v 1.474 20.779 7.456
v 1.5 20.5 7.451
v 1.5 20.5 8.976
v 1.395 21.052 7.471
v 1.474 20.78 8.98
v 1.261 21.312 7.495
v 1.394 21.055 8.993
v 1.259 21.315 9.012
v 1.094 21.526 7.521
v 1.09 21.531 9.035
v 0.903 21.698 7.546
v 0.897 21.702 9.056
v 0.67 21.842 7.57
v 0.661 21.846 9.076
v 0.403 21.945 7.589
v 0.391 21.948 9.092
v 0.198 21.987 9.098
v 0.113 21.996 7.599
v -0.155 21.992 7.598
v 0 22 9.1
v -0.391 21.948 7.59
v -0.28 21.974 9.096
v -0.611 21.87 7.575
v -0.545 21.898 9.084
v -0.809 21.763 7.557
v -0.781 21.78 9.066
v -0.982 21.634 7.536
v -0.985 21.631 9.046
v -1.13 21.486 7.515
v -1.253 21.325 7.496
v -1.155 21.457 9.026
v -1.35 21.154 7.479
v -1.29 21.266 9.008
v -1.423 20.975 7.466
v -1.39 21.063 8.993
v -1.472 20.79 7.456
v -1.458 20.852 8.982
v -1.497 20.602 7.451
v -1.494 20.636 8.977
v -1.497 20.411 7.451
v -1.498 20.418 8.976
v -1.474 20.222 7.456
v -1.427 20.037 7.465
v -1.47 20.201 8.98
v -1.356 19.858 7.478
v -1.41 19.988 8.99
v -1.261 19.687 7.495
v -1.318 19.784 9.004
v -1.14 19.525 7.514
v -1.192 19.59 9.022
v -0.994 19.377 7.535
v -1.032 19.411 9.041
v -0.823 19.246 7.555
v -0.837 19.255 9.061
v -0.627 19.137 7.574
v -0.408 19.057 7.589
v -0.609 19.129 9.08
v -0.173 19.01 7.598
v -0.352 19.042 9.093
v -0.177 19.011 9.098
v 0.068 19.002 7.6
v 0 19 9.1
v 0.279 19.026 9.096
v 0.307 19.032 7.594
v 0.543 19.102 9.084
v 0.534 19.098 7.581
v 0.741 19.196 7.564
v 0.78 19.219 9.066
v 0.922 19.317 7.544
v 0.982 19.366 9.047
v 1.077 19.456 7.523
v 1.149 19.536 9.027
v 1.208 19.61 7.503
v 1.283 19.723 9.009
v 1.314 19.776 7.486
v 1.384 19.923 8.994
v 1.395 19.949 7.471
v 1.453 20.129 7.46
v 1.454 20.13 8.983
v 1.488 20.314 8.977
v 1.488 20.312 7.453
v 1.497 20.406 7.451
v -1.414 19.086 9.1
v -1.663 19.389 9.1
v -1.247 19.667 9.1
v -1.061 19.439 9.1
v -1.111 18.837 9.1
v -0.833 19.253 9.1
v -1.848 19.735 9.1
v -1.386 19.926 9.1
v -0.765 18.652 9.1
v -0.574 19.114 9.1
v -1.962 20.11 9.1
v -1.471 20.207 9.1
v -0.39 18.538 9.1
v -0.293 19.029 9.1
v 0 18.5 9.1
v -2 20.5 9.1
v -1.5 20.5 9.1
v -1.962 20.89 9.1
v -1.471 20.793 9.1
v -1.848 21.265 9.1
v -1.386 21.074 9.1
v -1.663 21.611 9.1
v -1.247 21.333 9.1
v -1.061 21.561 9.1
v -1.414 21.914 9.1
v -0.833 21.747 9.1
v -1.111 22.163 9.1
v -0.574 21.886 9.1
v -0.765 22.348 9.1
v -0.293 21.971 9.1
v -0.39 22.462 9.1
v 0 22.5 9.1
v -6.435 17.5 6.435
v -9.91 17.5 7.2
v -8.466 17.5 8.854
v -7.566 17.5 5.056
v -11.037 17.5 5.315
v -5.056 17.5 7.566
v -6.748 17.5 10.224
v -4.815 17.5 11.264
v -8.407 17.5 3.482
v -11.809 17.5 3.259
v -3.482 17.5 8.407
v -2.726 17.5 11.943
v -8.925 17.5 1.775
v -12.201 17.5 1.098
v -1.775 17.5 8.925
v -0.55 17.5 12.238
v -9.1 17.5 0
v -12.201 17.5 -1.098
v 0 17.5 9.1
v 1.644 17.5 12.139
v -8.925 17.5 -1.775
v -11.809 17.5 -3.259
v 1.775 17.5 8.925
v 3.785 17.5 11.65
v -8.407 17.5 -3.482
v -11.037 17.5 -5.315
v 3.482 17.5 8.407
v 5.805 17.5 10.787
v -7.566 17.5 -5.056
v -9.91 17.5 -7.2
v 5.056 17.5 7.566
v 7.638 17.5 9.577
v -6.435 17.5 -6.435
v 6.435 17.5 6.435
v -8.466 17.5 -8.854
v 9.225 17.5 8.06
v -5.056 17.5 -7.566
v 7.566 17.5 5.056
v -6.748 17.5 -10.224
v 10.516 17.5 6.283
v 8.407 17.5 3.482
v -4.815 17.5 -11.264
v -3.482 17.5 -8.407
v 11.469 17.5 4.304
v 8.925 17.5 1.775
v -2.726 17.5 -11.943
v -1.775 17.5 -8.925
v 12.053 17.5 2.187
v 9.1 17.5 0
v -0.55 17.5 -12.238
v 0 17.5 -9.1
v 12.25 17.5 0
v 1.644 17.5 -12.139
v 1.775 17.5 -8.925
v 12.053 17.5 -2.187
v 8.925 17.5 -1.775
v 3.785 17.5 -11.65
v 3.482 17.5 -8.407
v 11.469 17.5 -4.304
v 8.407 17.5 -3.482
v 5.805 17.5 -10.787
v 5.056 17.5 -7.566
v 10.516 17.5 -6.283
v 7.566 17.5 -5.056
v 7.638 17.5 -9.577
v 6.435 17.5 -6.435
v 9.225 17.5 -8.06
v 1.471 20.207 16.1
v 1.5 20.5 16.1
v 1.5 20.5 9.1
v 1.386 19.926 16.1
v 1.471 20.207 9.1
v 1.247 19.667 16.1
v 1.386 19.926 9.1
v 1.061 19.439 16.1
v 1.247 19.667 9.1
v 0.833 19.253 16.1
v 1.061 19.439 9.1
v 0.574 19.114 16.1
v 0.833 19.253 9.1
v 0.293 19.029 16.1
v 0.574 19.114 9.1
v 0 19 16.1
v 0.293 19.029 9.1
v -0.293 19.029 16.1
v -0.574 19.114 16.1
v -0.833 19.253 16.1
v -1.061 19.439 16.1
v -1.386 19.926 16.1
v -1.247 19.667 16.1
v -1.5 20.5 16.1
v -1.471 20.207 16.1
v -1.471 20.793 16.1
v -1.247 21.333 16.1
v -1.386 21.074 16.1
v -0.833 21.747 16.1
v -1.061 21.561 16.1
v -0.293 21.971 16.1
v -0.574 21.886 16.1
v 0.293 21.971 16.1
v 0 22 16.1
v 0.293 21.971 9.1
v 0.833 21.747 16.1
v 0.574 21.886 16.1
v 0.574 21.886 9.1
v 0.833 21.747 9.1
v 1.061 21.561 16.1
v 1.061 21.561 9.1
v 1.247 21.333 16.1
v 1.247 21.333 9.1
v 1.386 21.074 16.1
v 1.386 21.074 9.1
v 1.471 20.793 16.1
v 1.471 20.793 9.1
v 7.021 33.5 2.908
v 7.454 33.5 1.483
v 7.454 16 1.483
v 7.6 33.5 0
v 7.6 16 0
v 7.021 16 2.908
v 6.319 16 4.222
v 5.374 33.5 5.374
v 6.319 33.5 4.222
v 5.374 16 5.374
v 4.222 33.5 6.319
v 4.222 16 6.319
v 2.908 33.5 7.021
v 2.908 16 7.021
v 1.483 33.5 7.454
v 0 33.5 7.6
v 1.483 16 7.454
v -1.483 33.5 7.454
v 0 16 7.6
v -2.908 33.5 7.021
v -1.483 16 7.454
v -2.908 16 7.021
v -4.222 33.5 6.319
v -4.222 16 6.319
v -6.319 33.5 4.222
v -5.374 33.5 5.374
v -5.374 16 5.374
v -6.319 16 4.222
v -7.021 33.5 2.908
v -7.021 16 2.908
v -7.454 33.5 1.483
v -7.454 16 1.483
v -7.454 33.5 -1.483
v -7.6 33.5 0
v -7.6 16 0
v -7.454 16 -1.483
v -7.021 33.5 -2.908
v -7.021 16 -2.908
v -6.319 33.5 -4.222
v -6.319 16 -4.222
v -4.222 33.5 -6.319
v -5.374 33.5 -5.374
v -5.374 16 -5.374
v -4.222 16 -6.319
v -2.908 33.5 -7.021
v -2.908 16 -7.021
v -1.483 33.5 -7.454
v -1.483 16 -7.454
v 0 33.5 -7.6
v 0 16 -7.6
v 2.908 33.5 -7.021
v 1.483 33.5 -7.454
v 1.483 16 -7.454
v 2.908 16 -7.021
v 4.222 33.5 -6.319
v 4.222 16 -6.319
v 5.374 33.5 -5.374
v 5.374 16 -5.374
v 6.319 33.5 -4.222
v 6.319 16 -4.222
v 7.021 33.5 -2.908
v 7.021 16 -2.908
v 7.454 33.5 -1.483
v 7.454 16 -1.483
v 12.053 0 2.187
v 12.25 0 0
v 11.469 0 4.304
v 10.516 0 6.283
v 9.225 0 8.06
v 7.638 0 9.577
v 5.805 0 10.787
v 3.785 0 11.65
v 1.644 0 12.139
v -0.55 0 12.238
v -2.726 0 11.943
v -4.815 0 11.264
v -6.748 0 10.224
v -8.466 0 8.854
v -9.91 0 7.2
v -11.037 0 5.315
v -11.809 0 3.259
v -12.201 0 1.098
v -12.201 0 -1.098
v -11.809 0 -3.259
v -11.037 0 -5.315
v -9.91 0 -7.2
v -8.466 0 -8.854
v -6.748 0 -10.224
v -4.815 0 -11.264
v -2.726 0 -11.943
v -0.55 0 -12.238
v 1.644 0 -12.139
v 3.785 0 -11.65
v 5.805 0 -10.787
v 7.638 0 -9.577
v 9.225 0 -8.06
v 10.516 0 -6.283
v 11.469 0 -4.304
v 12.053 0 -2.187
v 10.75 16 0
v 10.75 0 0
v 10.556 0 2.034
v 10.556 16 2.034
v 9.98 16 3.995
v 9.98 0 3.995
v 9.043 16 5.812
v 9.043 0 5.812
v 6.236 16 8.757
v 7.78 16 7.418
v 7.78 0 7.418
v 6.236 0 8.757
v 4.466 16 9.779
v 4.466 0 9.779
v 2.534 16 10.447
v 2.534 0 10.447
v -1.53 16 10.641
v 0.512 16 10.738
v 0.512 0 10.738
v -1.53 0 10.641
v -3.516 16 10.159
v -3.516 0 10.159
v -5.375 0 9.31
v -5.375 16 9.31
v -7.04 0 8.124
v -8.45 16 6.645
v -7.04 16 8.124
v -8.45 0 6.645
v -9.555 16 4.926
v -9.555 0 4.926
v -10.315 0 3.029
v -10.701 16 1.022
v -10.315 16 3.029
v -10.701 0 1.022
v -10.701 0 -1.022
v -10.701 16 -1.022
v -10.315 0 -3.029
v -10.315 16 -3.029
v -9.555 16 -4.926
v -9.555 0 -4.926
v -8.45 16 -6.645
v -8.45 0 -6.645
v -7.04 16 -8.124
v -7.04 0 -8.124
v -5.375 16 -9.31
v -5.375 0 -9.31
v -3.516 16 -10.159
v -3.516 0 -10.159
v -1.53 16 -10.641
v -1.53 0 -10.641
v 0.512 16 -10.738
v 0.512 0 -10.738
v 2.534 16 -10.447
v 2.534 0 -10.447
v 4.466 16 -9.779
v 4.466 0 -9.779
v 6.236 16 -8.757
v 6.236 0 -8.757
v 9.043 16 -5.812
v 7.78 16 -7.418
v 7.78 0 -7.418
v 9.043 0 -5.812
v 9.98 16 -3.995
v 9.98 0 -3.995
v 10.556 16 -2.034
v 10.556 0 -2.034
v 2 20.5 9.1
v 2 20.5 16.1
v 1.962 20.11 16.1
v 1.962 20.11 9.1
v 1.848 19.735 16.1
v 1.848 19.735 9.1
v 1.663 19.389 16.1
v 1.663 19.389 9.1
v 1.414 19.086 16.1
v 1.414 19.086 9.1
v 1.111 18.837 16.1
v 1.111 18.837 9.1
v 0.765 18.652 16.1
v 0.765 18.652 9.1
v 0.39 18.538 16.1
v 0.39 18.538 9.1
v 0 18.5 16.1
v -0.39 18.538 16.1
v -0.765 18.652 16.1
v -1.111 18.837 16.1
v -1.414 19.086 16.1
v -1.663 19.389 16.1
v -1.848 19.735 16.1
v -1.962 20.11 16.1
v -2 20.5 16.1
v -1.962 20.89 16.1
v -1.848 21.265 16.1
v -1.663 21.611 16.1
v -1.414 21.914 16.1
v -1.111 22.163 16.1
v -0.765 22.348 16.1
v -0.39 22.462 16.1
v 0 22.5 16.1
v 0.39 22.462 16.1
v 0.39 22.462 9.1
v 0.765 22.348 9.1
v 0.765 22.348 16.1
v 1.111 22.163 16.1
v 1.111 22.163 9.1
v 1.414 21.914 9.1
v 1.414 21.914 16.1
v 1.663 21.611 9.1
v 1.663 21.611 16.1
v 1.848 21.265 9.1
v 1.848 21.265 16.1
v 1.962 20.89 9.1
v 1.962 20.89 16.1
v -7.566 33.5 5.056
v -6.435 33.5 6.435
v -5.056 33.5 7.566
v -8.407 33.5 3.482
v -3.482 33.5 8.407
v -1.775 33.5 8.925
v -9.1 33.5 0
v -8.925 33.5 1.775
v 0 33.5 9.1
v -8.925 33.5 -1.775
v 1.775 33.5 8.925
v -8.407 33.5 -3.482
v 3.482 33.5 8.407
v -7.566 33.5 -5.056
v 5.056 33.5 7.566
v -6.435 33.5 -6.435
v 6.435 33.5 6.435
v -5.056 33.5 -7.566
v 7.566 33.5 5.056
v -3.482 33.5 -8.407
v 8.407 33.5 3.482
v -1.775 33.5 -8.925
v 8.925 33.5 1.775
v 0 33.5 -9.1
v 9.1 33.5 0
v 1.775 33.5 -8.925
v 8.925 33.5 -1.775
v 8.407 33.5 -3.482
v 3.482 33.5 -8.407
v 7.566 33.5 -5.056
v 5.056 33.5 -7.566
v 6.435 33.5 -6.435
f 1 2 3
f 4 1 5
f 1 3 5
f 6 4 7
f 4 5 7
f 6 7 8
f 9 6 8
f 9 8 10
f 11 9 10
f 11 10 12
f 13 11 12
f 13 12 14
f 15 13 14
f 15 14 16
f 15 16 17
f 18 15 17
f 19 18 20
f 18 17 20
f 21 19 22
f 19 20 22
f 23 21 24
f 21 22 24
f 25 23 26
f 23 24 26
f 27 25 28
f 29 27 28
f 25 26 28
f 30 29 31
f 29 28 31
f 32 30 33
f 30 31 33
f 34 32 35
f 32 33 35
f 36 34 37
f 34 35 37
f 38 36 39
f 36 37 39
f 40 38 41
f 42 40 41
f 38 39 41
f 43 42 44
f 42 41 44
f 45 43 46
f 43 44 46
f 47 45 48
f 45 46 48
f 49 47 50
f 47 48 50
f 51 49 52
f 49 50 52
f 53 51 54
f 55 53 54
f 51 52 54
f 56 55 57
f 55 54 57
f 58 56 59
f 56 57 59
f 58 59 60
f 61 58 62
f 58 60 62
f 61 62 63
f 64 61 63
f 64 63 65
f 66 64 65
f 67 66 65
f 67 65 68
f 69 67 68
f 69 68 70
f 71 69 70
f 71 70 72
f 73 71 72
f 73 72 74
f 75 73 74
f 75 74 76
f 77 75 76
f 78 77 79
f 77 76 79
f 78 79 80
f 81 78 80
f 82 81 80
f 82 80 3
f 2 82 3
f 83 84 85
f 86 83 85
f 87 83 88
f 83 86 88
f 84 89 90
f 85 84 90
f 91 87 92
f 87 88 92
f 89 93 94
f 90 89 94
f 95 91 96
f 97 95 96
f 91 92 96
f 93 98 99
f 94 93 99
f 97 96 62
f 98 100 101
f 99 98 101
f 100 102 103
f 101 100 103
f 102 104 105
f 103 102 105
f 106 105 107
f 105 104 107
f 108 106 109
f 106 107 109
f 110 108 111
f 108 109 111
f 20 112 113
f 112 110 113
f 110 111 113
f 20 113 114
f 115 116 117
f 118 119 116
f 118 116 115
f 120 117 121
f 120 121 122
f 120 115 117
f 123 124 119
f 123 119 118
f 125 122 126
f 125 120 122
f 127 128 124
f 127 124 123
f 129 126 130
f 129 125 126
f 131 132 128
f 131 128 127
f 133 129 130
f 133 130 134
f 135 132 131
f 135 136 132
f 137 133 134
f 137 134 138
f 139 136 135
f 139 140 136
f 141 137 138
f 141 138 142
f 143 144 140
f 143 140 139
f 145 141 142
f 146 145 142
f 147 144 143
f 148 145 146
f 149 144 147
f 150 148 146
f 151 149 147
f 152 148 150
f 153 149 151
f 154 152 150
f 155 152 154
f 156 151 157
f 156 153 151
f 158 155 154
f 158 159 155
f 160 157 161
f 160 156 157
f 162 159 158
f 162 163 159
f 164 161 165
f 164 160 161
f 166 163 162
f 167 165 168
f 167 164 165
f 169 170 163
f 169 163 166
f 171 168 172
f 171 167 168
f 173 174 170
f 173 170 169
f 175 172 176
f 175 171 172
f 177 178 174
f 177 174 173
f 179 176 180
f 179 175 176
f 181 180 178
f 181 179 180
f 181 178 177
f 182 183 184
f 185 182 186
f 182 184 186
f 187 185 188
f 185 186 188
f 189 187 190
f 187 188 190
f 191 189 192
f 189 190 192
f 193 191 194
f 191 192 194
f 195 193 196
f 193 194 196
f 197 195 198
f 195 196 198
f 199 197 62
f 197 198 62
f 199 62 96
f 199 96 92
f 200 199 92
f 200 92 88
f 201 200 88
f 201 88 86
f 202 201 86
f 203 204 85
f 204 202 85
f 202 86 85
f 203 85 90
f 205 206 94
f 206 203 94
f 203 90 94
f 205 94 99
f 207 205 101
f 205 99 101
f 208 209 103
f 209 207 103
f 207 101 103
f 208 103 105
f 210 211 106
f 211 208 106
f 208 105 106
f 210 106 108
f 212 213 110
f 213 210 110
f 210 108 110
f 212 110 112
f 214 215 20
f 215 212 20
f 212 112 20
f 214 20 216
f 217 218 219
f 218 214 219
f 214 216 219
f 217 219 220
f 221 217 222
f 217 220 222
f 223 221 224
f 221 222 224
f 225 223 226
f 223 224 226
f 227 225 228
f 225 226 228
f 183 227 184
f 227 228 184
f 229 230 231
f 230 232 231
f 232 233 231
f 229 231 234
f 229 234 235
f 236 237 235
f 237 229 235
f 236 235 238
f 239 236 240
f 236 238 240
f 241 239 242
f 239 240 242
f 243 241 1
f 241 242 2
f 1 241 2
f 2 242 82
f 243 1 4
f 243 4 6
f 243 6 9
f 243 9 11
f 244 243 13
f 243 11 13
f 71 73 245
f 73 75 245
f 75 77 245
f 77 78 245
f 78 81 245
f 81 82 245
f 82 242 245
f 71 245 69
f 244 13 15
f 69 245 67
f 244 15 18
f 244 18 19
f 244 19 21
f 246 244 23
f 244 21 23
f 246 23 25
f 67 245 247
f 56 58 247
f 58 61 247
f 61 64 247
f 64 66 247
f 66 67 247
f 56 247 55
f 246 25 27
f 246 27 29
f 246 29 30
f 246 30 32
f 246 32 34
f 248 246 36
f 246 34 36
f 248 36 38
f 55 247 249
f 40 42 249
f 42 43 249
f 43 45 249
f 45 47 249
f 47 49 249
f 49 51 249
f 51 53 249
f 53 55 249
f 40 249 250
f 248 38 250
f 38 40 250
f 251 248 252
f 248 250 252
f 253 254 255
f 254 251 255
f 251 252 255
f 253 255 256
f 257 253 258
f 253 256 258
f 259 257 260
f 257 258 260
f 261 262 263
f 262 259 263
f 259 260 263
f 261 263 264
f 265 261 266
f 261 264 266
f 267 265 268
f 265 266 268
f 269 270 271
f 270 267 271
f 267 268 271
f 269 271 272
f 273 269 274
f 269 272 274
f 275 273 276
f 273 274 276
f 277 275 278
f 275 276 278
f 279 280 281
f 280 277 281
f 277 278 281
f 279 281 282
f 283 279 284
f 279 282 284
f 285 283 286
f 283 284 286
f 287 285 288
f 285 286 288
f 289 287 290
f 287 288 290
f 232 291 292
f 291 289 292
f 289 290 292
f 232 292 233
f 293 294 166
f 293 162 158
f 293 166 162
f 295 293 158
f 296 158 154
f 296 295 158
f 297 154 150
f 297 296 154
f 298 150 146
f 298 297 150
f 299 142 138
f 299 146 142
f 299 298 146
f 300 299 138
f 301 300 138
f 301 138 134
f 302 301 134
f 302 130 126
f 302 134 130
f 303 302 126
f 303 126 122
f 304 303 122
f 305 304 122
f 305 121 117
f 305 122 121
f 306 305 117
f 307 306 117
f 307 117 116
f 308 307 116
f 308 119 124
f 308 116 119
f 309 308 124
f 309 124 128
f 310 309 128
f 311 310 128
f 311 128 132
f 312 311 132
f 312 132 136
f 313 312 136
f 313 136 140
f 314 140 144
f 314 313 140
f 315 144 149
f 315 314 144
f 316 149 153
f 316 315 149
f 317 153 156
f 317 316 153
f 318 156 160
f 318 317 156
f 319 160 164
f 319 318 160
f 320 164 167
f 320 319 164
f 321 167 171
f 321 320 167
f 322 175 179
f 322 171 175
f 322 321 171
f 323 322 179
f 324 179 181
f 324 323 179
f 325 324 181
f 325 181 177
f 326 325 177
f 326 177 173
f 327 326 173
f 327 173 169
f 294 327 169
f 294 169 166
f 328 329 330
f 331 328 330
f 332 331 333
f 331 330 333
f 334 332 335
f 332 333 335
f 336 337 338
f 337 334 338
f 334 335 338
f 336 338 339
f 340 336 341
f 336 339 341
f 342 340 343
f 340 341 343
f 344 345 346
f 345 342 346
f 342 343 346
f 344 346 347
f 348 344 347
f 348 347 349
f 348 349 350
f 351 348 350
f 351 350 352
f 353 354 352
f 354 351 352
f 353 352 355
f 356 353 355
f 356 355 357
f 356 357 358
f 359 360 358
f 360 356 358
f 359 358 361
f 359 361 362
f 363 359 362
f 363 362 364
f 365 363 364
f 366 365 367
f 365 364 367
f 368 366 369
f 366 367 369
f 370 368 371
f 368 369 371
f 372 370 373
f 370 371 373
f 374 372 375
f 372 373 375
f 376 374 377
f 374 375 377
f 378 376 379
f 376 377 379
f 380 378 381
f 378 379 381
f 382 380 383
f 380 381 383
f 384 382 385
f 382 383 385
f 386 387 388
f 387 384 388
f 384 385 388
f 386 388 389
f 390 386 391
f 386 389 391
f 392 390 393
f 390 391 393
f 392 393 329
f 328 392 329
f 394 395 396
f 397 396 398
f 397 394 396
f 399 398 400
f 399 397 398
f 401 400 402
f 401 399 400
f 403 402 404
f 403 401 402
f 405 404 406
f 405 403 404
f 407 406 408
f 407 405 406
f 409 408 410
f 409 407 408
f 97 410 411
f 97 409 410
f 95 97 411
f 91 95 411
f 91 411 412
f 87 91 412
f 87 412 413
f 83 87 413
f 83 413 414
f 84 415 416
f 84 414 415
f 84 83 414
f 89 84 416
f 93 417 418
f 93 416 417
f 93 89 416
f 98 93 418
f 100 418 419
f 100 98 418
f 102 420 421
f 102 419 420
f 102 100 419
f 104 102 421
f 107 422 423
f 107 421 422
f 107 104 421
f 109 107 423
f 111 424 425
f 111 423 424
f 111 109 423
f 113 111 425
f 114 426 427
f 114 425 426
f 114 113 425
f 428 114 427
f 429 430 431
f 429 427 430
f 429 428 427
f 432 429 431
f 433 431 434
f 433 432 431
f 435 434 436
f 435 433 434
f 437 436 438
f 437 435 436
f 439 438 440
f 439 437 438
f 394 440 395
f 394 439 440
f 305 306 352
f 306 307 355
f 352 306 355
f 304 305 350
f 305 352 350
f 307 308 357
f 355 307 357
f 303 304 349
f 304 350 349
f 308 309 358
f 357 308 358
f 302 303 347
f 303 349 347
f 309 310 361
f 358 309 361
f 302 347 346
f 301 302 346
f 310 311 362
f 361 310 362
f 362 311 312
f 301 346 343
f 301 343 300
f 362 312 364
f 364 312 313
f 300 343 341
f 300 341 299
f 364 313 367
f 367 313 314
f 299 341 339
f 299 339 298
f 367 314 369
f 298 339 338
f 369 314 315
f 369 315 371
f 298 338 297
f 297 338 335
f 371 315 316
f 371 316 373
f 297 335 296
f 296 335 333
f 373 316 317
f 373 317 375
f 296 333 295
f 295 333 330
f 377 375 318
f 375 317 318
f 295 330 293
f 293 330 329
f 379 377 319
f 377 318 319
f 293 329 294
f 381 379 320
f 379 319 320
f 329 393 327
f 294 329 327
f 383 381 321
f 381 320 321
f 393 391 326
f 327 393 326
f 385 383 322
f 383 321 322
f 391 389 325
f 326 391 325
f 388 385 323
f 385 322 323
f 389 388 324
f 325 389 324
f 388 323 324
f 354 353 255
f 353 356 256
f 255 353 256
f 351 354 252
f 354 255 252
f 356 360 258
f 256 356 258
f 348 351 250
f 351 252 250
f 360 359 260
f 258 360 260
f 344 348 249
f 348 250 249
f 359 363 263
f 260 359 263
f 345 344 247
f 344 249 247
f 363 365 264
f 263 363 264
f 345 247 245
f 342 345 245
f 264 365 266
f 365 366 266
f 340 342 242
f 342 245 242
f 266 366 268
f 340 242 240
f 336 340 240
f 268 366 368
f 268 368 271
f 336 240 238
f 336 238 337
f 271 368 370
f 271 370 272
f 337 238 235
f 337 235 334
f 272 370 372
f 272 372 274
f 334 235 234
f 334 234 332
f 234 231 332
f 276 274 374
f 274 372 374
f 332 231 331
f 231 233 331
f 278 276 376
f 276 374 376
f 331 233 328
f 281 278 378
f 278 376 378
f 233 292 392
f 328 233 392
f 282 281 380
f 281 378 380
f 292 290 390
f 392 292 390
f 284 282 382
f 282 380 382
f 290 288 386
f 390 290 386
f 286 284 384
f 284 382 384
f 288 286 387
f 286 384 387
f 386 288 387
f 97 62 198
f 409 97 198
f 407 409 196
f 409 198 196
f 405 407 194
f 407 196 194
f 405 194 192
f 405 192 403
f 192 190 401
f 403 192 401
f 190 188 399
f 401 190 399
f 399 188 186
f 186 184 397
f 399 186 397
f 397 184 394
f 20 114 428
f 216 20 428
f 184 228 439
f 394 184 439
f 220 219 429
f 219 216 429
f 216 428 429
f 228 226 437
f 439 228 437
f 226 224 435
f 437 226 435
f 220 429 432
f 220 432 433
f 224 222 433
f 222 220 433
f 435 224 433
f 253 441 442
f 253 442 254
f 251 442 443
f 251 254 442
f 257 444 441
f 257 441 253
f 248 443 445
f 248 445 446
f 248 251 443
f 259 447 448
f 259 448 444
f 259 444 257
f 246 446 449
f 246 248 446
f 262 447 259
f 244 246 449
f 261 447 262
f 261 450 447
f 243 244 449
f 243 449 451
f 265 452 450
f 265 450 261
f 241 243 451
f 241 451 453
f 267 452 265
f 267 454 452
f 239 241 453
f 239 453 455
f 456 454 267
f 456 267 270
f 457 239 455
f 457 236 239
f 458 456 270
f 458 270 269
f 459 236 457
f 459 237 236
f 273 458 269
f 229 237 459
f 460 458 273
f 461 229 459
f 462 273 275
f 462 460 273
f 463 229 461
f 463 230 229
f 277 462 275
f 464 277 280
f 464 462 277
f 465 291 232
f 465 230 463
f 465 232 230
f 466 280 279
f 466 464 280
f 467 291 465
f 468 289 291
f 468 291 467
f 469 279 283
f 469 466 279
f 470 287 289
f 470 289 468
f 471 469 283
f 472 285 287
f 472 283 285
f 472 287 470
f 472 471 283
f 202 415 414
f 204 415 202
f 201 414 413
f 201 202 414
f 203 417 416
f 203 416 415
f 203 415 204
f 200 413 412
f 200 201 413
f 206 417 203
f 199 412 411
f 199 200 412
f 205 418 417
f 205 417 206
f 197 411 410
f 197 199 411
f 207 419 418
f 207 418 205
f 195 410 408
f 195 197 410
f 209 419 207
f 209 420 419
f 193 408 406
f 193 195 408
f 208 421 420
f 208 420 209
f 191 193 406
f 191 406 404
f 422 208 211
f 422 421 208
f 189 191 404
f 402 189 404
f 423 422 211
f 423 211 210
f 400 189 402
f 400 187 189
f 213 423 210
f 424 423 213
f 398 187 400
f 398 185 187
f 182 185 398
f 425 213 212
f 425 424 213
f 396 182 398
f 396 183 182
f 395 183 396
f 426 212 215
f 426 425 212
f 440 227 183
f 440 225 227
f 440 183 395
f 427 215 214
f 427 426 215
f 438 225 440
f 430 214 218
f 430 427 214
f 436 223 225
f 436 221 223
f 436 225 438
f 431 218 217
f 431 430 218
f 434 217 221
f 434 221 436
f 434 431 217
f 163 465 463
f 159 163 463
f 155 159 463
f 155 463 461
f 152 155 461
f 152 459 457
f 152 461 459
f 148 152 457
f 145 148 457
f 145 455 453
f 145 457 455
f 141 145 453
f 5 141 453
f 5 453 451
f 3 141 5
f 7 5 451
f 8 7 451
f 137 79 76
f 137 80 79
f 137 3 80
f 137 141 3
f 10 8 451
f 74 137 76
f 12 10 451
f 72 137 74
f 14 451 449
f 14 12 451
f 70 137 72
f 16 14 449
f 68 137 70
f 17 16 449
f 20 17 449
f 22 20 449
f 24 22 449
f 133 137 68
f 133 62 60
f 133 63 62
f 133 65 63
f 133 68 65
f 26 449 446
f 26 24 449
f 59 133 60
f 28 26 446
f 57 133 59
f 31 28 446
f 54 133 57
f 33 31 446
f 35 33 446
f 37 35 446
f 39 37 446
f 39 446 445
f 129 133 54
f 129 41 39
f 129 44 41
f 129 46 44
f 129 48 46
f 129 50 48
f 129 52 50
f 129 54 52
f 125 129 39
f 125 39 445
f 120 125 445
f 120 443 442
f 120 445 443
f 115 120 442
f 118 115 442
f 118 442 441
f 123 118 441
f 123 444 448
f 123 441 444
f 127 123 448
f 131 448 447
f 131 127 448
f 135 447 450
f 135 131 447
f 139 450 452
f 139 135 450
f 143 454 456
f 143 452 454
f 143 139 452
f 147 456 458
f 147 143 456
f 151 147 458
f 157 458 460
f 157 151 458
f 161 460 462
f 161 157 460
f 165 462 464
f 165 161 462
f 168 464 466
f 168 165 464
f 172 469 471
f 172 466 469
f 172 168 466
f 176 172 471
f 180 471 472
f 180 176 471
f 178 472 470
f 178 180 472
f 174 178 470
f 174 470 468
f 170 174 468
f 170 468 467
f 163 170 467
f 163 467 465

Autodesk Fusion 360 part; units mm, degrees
sketch "Sketch1" plane through (0, 0, 0) normal (0, 1, 0) x (1, 0, 0)
  circle A0 centre (0, 0) radius 12.25
  circle A1 centre (0, 0) radius 10.75
  dimension "d1" = 24.5
  dimension "d2" = 1.5
extrude "Extrude1" add sketch "Sketch1" along normal blind 16 makes body 1
ref_plane "WorkPlane1" through (0, 16, 0) normal (0, 1, 0) x (1, 0, 0)
sketch "Sketch2" plane through (0, 16, 0) normal (0, 1, 0) x (1, 0, 0)
  circle A0 centre (0, 0) radius 12.25
  circle A1 centre (0, 0) radius 12.25
extrude "Extrude2" add sketch "Sketch2" along normal blind 1.5 bodies 1
ref_plane "WorkPlane2" through (0, 17.5, 0) normal (0, 1, 0) x (1, 0, 0)
sketch "Sketch3" plane through (0, 17.5, 0) normal (0, 1, 0) x (1, 0, 0)
  circle A0 centre (0, 0) radius 7.6
  circle A1 centre (0, 0) radius 9.1
  dimension "d9" = 15.2
  dimension "d10" = 1.5
extrude "Extrude4" add sketch "Sketch3" along normal blind 16 bodies 1
extrude "Extrude3" cut sketch "Sketch3" against normal blind 1.5 contours A0 bodies 1
ref_plane "WorkPlane3" through (0, 21.8424, 9.1) normal (0, 0, 1) x (-1, 0, 0)
sketch "Sketch4" plane through (0, 21.8424, 9.1) normal (0, 0, 1) x (1, 0, 0)
  circle A0 centre (0, -1.3424) radius 2
  circle A1 centre (0, -1.3424) radius 1.5
  line L0 (0, 0) -> (0, 13.5992) construction
  line L1 (9.1, -4.3424) -> (-9.1, -4.3424) construction
  dimension "d16" = 4
  dimension "d17" = 0.5
  dimension "d18" = 3
extrude "Extrude6" add sketch "Sketch4" along normal blind 7 bodies 1
extrude "Extrude5" cut sketch "Sketch4" along normal mid plane 10 contours A1 bodies 1
copy_body "Body->Comp1" bodies 1 removing the originals makes body 2 in component "Adapter"
component "Adapter" placed x (1, 0, 0) y (0, 1, 0) z (0, 0, 1) at (0, 0, 0)
